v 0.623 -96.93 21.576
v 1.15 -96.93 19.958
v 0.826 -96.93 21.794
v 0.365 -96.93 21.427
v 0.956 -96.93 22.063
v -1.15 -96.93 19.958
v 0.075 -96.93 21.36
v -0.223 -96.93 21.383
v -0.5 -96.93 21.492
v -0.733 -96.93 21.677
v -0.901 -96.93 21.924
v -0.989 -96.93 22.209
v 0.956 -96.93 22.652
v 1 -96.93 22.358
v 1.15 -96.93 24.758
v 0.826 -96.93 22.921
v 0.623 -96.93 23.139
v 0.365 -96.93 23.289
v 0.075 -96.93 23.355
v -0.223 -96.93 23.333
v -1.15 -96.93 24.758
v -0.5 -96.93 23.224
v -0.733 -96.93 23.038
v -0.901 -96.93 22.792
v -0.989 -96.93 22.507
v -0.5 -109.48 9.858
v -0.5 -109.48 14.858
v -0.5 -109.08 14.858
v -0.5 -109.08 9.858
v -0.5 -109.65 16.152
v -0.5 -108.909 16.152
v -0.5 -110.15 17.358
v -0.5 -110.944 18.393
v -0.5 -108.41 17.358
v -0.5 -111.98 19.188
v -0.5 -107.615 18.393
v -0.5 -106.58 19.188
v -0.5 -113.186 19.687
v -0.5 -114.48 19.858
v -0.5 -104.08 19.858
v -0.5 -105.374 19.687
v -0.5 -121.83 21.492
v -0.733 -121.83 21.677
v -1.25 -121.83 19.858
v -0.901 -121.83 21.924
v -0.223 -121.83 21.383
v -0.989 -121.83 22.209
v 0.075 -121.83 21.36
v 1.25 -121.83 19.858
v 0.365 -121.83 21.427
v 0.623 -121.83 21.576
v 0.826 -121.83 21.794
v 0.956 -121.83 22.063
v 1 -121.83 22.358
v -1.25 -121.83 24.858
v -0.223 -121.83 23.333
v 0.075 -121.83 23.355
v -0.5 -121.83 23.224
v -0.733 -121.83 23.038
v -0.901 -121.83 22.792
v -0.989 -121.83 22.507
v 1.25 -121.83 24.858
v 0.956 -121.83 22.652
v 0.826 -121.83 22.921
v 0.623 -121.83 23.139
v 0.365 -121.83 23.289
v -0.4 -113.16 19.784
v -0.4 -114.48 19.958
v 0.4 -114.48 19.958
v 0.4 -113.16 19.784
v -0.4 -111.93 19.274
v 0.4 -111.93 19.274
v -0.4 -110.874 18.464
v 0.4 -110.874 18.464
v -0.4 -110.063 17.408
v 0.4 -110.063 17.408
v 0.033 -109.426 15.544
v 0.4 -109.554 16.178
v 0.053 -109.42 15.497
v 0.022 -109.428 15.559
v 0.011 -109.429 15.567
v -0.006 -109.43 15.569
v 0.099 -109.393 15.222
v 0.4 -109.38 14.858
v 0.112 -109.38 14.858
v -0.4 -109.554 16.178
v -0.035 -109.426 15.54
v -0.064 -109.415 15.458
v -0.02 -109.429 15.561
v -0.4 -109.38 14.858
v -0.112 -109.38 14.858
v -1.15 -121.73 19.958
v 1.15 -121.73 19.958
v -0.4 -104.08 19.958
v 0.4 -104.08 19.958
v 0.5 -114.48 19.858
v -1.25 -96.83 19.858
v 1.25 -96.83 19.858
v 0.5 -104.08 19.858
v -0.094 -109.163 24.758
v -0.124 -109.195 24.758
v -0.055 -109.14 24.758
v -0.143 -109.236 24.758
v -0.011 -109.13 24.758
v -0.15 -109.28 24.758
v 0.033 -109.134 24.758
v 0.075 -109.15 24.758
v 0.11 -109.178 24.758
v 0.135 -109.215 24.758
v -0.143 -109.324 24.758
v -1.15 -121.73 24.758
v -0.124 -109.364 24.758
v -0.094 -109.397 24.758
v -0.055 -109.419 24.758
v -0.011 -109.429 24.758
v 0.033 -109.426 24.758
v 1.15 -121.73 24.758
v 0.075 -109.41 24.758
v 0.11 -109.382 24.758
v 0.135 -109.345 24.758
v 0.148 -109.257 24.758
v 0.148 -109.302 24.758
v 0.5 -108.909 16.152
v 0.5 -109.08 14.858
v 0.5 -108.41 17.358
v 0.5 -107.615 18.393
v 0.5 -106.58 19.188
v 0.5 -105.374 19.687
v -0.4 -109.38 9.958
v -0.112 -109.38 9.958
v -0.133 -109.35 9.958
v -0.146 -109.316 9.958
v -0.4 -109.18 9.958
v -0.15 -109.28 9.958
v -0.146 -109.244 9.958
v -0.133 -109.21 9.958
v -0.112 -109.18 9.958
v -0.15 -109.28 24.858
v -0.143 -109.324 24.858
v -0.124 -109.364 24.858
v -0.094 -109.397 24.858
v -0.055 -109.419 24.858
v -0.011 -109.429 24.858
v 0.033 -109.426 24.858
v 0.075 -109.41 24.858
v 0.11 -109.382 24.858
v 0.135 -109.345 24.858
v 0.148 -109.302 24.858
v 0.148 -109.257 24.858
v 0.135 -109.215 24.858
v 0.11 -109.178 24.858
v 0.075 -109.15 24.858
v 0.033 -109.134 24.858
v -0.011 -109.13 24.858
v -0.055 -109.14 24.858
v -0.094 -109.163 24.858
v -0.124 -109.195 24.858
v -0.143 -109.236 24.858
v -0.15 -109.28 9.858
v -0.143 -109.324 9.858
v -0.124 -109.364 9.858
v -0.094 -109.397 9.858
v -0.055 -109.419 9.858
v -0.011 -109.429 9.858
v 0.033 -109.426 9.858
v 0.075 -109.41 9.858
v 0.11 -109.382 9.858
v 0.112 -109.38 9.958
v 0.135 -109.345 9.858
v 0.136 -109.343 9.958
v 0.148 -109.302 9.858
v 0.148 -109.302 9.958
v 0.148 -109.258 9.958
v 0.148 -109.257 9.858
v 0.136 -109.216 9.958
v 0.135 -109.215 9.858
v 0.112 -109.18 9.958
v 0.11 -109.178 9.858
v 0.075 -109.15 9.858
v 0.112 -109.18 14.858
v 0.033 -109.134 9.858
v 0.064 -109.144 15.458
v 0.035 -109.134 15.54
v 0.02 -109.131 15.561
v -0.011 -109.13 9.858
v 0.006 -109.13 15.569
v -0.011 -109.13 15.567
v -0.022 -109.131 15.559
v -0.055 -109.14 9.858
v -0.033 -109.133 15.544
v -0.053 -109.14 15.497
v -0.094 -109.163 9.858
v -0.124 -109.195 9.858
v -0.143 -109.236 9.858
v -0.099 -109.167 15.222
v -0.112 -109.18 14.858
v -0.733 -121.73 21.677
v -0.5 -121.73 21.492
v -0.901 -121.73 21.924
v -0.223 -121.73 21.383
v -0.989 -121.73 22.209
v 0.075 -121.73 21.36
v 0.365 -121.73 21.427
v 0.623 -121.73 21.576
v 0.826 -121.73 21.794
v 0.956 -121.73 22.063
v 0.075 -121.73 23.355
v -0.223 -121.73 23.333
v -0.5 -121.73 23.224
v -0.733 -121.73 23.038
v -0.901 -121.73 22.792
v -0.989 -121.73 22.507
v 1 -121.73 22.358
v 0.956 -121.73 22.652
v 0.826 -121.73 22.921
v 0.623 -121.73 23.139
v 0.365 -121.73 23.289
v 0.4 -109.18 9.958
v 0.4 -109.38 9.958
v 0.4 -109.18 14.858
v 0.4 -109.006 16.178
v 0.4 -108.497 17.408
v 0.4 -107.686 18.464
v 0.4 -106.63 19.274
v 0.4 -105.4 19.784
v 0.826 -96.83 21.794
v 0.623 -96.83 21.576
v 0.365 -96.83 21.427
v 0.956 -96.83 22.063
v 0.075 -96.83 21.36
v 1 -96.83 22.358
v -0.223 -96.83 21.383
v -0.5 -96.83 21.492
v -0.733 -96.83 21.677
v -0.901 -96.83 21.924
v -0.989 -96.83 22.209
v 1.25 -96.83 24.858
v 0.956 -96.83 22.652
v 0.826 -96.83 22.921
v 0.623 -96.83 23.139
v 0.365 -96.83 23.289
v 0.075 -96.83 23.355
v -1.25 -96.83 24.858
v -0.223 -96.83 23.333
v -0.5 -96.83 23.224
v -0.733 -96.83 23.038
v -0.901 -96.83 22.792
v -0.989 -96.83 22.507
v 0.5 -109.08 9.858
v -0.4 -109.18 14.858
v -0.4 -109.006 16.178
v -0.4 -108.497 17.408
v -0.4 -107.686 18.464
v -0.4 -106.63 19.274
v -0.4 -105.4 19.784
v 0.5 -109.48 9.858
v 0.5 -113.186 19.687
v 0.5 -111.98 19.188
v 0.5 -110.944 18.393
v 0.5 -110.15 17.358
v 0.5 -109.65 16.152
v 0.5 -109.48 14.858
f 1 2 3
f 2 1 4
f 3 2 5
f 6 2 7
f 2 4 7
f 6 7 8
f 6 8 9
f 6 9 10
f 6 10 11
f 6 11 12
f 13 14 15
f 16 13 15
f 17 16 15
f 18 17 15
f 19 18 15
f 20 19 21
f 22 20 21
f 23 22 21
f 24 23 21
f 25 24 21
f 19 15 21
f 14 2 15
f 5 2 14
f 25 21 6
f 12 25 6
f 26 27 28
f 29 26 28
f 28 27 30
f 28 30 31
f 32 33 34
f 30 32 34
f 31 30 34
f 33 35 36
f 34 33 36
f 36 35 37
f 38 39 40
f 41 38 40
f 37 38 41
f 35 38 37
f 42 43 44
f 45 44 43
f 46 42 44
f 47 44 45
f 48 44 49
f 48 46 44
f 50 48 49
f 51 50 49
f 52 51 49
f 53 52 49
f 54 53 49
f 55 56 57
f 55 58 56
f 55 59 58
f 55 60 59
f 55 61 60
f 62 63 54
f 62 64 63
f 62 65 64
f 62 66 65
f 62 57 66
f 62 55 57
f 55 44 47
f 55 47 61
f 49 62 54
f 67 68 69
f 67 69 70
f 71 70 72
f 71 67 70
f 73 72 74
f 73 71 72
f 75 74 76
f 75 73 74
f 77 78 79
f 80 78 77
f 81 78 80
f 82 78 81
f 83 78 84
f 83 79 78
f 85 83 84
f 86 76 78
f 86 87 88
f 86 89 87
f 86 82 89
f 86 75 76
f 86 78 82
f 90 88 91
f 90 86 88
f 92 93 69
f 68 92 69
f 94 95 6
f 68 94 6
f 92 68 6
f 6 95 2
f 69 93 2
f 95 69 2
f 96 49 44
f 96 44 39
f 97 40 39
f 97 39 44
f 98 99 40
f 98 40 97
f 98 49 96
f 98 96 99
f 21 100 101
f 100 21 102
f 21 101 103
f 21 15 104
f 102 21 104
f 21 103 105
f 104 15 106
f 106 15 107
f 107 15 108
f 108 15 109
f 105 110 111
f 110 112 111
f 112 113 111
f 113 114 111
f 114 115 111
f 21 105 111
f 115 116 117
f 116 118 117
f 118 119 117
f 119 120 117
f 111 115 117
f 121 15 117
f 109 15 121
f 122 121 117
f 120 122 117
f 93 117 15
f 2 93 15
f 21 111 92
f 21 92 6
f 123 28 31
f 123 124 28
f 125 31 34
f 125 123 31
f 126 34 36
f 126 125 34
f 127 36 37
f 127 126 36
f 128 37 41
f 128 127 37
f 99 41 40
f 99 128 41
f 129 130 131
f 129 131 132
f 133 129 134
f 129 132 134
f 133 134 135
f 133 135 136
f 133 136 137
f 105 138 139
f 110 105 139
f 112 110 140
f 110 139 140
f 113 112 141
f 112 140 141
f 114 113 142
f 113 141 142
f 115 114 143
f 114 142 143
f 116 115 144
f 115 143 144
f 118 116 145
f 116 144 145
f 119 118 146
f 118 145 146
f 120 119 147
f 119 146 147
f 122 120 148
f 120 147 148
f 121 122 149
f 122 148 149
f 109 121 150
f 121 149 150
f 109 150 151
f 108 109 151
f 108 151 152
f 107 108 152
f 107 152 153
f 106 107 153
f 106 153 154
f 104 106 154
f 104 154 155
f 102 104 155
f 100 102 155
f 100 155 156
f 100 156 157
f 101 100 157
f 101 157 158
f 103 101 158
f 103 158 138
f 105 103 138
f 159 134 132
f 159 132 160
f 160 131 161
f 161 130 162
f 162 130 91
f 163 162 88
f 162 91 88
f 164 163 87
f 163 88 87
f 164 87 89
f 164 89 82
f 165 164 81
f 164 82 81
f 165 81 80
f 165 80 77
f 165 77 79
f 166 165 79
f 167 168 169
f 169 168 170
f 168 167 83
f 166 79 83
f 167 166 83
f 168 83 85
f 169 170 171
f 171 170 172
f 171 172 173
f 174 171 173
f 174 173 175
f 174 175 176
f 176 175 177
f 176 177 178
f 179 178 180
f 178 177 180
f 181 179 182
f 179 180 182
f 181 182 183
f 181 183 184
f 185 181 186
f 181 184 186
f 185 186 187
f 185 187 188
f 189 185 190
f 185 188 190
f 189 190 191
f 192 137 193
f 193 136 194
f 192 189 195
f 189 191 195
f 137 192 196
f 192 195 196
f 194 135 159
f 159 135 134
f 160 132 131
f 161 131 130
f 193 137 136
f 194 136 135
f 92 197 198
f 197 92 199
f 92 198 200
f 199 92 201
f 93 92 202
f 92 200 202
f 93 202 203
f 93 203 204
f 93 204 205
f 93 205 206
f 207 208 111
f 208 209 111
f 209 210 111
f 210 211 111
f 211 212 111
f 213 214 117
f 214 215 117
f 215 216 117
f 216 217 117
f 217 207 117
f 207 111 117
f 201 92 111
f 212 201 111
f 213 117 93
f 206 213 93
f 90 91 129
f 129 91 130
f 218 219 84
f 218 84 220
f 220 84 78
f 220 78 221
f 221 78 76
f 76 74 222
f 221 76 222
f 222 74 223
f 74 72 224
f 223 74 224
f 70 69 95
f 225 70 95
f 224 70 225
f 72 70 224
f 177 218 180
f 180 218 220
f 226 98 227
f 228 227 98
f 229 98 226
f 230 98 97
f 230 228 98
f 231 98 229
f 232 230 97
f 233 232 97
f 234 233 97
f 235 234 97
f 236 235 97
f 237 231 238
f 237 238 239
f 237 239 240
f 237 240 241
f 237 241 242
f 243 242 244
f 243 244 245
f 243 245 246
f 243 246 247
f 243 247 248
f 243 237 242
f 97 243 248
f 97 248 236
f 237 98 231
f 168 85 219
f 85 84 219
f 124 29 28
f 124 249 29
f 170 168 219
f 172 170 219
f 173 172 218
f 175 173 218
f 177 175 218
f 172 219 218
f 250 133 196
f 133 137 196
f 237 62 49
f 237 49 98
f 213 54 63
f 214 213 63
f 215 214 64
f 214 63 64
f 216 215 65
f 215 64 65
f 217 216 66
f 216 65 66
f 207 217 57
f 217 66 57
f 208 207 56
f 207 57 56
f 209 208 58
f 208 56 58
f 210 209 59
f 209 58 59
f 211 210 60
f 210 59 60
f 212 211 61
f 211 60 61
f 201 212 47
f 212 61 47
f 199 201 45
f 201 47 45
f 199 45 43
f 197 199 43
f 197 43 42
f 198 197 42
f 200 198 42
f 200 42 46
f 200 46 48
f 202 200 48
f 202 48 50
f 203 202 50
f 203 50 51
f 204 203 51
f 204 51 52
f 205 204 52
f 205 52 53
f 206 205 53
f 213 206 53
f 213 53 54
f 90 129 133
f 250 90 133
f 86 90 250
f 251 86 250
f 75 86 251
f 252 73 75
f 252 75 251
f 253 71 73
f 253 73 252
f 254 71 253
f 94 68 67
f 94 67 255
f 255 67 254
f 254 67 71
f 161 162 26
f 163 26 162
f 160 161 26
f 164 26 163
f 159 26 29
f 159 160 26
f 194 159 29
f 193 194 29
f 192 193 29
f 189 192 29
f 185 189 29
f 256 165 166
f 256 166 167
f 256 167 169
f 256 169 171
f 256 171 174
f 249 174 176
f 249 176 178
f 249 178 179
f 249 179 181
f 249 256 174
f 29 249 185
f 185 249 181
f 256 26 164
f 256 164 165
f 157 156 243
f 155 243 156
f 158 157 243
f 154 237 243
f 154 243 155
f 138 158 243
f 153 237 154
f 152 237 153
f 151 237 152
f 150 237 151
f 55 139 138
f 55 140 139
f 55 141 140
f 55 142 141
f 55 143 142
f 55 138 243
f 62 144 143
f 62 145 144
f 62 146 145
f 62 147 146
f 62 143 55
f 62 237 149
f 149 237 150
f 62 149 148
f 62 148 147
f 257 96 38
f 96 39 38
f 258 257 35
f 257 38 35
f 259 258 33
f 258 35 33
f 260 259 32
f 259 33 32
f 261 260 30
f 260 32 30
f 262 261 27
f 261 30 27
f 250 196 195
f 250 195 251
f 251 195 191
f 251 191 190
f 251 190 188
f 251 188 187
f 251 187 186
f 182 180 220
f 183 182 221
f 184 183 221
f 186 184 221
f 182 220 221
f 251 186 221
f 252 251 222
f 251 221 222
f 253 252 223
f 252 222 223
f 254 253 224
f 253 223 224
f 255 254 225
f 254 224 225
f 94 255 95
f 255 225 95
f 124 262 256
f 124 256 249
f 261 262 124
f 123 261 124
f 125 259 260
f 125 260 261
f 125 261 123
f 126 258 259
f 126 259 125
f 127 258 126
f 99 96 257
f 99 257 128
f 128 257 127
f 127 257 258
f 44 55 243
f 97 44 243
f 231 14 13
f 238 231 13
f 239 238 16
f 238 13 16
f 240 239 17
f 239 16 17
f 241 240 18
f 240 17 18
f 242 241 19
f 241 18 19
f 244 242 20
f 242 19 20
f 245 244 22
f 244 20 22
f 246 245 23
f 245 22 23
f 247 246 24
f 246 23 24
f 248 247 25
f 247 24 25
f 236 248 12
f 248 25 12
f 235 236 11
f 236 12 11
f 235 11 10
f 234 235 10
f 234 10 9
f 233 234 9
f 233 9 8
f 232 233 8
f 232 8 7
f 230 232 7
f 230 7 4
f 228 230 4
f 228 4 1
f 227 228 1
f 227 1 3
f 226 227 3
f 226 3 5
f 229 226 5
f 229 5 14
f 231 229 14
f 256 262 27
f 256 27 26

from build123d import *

# Parameters (mm, degrees)
F1_DEPTH = 1.25
F2_DEPTH = 0.5
F3_DEPTH = 0.5
F4_T     = -0.1
F6_DEPTH = 0.1
F8_DEPTH = 0.1
F9_D     = 2
F11_D    = 0.3


with BuildPart() as f1:
    # F0 (on Right) → F1 (new body, symmetric)
    with BuildSketch(Plane.YZ):
        Polygon((-96.8298226595, 19.8576506227), (-96.8298226595, 24.8576506227), (-121.8298226595, 24.8576506227), (-121.8298226595, 19.8576506227), (-114.4798226595, 19.8576506227), (-114.3298226595, 19.8576506227), (-114.2798226595, 19.8576506227), (-109.2798226595, 19.8576506227), (-104.2298226595, 19.8576506227), (-104.0798226595, 19.8576506227), align=None)
    extrude(amount=F1_DEPTH, both=True)

    # F0 (on Right) → F2 (join)
    with BuildSketch(Plane.YZ):
        with BuildLine():
            ThreePointArc((-109.0798226595, 14.8576506227), (-107.6153565654, 18.3931845287), (-104.0798226595, 19.8576506227))
            Line((-104.0798226595, 19.8576506227), (-104.2298226595, 19.8576506227))
            Line((-104.2298226595, 19.8576506227), (-109.2798226595, 19.8576506227))
            Line((-109.2798226595, 19.8576506227), (-109.2798226595, 9.8576506227))
            Line((-109.2798226595, 9.8576506227), (-109.0798226595, 9.8576506227))
            Line((-109.0798226595, 9.8576506227), (-109.0798226595, 14.8576506227))
        make_face()
        with BuildLine():
            Line((-114.3298226595, 19.8576506227), (-114.4798226595, 19.8576506227))
            ThreePointArc((-114.4798226595, 19.8576506227), (-110.9442887536, 18.3931845287), (-109.4798226595, 14.8576506227))
            Line((-109.4798226595, 14.8576506227), (-109.4798226595, 9.8576506227))
            Line((-109.4798226595, 9.8576506227), (-109.2798226595, 9.8576506227))
            Line((-109.2798226595, 9.8576506227), (-109.2798226595, 19.8576506227))
            Line((-109.2798226595, 19.8576506227), (-114.2798226595, 19.8576506227))
            Line((-114.2798226595, 19.8576506227), (-114.3298226595, 19.8576506227))
        make_face()
    extrude(amount=F2_DEPTH)

    # F0 (on Right) → F3 (join)
    with BuildSketch(Plane.YZ):
        with BuildLine():
            ThreePointArc((-109.0798226595, 14.8576506227), (-107.6153565654, 18.3931845287), (-104.0798226595, 19.8576506227))
            Line((-104.0798226595, 19.8576506227), (-104.2298226595, 19.8576506227))
            Line((-104.2298226595, 19.8576506227), (-109.2798226595, 19.8576506227))
            Line((-109.2798226595, 19.8576506227), (-109.2798226595, 9.8576506227))
            Line((-109.2798226595, 9.8576506227), (-109.0798226595, 9.8576506227))
            Line((-109.0798226595, 9.8576506227), (-109.0798226595, 14.8576506227))
        make_face()
        with BuildLine():
            Line((-114.3298226595, 19.8576506227), (-114.4798226595, 19.8576506227))
            ThreePointArc((-114.4798226595, 19.8576506227), (-110.9442887536, 18.3931845287), (-109.4798226595, 14.8576506227))
            Line((-109.4798226595, 14.8576506227), (-109.4798226595, 9.8576506227))
            Line((-109.4798226595, 9.8576506227), (-109.2798226595, 9.8576506227))
            Line((-109.2798226595, 9.8576506227), (-109.2798226595, 19.8576506227))
            Line((-109.2798226595, 19.8576506227), (-114.2798226595, 19.8576506227))
            Line((-114.2798226595, 19.8576506227), (-114.3298226595, 19.8576506227))
        make_face()
    extrude(amount=-F3_DEPTH)

    # F4
    f4_openings = [f1.faces().sort_by_distance(p)[0] for p in [
        (0, -96.829823, 22.357651),
        (0, -121.829823, 22.357651),
    ]]
    offset(amount=F4_T, openings=f4_openings, kind=Kind.INTERSECTION)

    # F5 (on face) → F6 (join)
    with BuildSketch(Plane.XZ.offset(121.8298226595)):
        Polygon((0, 24.7576506227), (-1.15, 24.7576506227), (-1.15, 19.9576506227), (0, 19.9576506227), (0, 22.4076506227), align=None)
        Polygon((1.15, 24.7576506227), (0, 24.7576506227), (0, 22.4076506227), (0, 19.9576506227), (1.15, 19.9576506227), align=None)
    extrude(amount=-F6_DEPTH)

    # F7 (on face) → F8 (join)
    with BuildSketch(Plane(origin=(0, -96.8298226595, 0), x_dir=(-1, 0, 0), z_dir=(0, 1, 0))):
        Polygon((0, 24.7576506227), (-1.15, 24.7576506227), (-1.15, 19.9576506227), (0, 19.9576506227), (0, 22.3576506227), align=None)
        Polygon((1.15, 24.7576506227), (0, 24.7576506227), (0, 22.3576506227), (0, 19.9576506227), (1.15, 19.9576506227), align=None)
    extrude(amount=-F8_DEPTH)

    # F9 (through all)
    with Locations(Plane(origin=(0, -96.8298226595, 0), x_dir=(-1, 0, 0), z_dir=(0, 1, 0))):
        with Locations((0, 22.3576506227)):
            Hole(F9_D / 2)

    # F11 (through all)
    with Locations(Plane(origin=(0, 0, 9.8576506227), x_dir=(1, 0, 0), z_dir=(0, 0, -1))):
        with Locations((0, 109.2798226595)):
            Hole(F11_D / 2)


solid = f1.part
